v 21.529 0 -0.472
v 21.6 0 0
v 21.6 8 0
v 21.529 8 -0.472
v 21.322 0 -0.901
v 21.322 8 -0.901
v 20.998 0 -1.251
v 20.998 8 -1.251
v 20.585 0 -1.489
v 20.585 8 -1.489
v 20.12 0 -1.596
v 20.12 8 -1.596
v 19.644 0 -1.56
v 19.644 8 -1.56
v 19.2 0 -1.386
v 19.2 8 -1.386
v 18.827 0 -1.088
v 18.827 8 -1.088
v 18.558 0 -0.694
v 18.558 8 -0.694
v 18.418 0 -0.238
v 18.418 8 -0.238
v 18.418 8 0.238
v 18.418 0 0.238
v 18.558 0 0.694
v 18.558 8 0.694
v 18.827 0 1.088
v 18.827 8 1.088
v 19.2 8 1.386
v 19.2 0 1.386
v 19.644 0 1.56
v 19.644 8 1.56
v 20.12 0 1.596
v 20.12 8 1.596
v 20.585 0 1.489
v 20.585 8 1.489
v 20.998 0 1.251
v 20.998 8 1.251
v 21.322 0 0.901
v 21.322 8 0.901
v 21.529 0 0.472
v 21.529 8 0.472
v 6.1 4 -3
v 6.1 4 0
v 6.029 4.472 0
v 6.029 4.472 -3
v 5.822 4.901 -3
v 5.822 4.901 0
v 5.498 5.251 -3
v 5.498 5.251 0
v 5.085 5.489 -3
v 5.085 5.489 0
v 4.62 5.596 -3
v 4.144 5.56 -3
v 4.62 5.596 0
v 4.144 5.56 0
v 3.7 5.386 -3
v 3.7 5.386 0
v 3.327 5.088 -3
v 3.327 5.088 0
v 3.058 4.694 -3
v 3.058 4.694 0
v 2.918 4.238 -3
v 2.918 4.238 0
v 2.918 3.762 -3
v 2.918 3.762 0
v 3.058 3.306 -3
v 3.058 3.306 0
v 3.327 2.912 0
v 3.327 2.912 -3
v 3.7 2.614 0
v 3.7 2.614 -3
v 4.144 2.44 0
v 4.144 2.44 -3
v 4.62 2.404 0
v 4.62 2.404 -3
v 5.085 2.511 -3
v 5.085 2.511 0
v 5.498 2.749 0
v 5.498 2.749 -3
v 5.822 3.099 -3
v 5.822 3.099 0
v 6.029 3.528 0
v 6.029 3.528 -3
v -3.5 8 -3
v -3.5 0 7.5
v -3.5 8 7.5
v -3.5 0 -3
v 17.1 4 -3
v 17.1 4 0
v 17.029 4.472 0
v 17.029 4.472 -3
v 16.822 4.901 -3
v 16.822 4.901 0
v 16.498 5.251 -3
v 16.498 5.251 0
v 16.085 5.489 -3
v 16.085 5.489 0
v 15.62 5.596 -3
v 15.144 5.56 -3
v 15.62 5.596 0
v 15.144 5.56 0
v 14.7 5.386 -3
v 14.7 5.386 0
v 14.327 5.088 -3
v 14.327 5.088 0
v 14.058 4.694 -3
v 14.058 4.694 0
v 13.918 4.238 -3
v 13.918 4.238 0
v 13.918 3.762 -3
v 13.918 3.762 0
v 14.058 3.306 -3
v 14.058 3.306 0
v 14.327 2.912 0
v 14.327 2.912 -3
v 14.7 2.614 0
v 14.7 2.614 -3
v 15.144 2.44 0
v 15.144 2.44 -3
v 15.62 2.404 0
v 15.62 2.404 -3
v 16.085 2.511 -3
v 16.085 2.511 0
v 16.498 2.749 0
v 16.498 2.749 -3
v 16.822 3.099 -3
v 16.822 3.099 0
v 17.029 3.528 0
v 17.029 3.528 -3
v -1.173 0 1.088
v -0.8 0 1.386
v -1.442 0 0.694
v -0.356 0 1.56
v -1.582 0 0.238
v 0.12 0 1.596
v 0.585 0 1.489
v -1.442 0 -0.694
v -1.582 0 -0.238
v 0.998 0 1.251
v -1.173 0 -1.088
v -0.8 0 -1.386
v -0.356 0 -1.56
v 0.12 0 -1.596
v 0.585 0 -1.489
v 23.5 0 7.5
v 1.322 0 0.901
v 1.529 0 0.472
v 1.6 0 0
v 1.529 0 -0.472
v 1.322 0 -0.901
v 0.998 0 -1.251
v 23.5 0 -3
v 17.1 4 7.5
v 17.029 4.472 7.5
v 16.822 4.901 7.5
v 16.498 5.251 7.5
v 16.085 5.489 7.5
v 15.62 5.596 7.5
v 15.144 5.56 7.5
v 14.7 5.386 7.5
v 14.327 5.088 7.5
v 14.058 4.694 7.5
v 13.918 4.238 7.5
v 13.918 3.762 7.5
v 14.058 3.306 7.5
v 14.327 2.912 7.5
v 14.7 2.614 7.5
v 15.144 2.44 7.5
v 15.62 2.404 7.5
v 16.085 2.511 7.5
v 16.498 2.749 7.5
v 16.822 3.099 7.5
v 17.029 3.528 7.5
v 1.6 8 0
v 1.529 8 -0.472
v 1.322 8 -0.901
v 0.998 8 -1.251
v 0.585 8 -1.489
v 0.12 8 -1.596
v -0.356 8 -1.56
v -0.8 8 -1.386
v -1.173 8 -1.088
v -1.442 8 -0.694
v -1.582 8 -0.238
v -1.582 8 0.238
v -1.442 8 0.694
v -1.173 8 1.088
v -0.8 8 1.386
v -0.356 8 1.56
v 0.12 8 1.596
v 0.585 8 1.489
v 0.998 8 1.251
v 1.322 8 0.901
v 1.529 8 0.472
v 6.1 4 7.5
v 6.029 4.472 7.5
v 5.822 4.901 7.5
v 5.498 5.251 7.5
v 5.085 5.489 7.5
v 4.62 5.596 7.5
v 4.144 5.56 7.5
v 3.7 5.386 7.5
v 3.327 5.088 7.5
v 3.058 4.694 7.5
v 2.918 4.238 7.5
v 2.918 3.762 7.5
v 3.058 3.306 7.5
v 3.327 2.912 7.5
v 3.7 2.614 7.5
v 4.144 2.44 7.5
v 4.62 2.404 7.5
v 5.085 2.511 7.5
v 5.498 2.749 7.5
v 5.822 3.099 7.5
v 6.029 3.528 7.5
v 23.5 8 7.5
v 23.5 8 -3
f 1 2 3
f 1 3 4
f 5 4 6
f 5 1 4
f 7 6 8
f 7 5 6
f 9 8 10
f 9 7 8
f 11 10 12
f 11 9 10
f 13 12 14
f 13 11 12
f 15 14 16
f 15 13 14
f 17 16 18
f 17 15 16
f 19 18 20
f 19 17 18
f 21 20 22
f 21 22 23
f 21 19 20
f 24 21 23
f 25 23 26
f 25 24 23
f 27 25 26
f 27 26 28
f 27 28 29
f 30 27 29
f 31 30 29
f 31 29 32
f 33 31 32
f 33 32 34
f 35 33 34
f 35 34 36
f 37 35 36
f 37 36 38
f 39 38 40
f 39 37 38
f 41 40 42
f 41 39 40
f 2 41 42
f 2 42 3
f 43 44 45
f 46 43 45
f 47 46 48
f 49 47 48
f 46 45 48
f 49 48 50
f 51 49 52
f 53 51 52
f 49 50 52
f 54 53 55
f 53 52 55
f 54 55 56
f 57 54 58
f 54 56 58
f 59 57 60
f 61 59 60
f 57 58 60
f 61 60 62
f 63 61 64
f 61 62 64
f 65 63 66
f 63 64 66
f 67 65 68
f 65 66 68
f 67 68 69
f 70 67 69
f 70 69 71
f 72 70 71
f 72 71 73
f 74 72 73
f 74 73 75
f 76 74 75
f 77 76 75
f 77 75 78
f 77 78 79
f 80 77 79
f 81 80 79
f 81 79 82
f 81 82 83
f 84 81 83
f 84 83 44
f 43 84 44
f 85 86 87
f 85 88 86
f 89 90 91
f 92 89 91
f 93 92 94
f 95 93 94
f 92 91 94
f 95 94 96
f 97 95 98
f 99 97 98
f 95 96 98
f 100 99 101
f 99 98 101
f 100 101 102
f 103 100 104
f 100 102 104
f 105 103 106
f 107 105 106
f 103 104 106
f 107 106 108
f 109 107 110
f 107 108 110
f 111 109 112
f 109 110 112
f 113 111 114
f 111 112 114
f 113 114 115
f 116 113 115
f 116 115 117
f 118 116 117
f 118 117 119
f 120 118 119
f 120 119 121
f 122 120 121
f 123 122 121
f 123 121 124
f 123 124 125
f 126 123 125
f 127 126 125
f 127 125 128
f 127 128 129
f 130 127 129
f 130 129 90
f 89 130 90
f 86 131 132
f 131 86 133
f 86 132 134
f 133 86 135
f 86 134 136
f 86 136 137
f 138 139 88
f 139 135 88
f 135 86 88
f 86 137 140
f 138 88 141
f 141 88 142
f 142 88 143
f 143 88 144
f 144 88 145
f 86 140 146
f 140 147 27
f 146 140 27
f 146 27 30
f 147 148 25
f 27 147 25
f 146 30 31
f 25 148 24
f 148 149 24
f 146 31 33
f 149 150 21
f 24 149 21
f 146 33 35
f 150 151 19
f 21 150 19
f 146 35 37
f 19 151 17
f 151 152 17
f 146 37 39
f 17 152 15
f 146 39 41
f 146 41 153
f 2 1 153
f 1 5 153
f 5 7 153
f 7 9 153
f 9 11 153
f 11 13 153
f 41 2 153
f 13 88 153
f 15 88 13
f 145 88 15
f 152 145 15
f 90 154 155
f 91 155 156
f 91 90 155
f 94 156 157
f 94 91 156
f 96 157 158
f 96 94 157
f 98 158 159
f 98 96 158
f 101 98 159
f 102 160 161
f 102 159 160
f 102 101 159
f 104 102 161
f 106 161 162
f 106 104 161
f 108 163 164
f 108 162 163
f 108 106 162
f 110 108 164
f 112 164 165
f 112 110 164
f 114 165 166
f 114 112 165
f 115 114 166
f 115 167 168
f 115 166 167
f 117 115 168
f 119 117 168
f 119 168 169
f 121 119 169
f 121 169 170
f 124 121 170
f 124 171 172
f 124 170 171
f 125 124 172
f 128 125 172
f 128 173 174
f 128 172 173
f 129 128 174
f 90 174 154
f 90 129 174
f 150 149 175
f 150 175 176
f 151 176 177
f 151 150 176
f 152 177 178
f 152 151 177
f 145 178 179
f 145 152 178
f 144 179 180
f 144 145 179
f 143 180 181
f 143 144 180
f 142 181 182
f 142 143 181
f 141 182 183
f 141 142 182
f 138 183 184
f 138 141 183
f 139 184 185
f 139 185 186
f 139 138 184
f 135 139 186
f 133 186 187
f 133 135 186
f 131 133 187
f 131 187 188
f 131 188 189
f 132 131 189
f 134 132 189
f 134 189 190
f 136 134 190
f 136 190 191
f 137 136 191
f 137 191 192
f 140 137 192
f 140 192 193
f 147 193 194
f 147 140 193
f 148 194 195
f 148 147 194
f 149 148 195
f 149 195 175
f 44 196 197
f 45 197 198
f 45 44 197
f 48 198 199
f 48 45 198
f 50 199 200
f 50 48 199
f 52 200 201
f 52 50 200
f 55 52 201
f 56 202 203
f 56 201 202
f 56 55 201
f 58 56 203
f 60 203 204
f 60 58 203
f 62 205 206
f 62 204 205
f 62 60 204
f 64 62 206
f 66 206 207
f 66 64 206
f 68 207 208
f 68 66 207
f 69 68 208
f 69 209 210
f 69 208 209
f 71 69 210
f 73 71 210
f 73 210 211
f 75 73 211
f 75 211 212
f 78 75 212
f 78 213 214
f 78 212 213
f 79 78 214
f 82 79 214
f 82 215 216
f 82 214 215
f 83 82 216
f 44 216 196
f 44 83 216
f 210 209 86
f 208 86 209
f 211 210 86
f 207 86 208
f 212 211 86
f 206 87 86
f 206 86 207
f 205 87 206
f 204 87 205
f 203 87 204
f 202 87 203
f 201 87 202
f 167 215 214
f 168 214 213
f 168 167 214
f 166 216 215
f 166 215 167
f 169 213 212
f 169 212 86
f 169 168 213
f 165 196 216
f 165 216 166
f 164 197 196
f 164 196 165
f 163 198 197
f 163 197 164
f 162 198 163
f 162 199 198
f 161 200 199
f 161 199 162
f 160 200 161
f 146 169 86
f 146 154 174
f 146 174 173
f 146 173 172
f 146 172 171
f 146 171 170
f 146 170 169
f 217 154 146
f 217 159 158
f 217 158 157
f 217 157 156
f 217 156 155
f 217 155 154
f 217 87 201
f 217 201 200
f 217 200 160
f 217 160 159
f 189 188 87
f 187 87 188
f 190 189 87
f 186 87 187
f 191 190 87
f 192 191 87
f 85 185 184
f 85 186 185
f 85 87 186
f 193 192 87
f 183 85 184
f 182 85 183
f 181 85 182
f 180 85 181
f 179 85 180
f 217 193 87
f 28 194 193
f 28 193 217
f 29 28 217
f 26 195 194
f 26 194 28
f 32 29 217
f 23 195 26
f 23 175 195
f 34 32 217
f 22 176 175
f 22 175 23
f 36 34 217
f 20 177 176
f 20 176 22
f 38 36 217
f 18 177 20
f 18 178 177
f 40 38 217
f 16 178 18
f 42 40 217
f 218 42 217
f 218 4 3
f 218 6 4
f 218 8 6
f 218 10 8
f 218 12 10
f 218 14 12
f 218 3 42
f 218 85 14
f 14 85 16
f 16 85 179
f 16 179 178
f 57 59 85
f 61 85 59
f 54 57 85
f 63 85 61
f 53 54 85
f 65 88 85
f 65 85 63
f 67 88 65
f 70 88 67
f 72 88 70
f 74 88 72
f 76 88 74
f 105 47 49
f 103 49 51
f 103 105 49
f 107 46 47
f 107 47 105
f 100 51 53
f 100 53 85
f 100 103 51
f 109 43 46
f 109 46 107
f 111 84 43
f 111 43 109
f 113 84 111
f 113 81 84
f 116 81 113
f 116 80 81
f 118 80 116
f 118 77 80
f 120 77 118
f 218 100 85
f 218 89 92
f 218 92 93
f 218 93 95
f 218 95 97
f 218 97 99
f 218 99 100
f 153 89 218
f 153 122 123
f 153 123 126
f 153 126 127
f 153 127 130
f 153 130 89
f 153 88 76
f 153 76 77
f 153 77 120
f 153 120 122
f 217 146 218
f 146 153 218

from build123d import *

# Parameters (mm, degrees)
SKETCH1_W               = 27
SKETCH1_H               = 6
SKETCH1_R               = 1.6
BOSS_EXTRUDE1_DEPTH     = 8
SKETCH3_W               = 27
SKETCH3_H               = 8
BOSS_EXTRUDE2_DEPTH     = 4.5
SKETCH2_R               = 1.6
CUT_EXTRUDE1_DEPTH      = 8.5
CUT_EXTRUDE1_DEPTH_BACK = 4


with BuildPart() as part:
    # Sketch1 → Boss-Extrude1 (new body)
    with BuildSketch(Plane(origin=(0, 0, 0), x_dir=(1, 0, 0), z_dir=(0, 1, 0))):
        with Locations((10, 0)):
            Rectangle(SKETCH1_W, SKETCH1_H)
        Circle(SKETCH1_R, mode=Mode.SUBTRACT)
        with Locations((20, 0)):
            Circle(SKETCH1_R, mode=Mode.SUBTRACT)
    extrude(amount=BOSS_EXTRUDE1_DEPTH)

    # Sketch3 → Boss-Extrude2 (add)
    with BuildSketch(Plane.XY.offset(3)):
        with Locations((10, 4)):
            Rectangle(SKETCH3_W, SKETCH3_H)
    extrude(amount=BOSS_EXTRUDE2_DEPTH)

    # Sketch2 → Cut-Extrude1 (cut, two sides)
    with BuildSketch(Plane.XY) as cut_extrude1_sk:
        with Locations((4.5, 4)):
            Circle(SKETCH2_R)
        with Locations((15.5, 4)):
            Circle(SKETCH2_R)
    extrude(amount=CUT_EXTRUDE1_DEPTH, mode=Mode.SUBTRACT)
    extrude(cut_extrude1_sk.sketch, amount=-CUT_EXTRUDE1_DEPTH_BACK, mode=Mode.SUBTRACT)


solid = part.part
